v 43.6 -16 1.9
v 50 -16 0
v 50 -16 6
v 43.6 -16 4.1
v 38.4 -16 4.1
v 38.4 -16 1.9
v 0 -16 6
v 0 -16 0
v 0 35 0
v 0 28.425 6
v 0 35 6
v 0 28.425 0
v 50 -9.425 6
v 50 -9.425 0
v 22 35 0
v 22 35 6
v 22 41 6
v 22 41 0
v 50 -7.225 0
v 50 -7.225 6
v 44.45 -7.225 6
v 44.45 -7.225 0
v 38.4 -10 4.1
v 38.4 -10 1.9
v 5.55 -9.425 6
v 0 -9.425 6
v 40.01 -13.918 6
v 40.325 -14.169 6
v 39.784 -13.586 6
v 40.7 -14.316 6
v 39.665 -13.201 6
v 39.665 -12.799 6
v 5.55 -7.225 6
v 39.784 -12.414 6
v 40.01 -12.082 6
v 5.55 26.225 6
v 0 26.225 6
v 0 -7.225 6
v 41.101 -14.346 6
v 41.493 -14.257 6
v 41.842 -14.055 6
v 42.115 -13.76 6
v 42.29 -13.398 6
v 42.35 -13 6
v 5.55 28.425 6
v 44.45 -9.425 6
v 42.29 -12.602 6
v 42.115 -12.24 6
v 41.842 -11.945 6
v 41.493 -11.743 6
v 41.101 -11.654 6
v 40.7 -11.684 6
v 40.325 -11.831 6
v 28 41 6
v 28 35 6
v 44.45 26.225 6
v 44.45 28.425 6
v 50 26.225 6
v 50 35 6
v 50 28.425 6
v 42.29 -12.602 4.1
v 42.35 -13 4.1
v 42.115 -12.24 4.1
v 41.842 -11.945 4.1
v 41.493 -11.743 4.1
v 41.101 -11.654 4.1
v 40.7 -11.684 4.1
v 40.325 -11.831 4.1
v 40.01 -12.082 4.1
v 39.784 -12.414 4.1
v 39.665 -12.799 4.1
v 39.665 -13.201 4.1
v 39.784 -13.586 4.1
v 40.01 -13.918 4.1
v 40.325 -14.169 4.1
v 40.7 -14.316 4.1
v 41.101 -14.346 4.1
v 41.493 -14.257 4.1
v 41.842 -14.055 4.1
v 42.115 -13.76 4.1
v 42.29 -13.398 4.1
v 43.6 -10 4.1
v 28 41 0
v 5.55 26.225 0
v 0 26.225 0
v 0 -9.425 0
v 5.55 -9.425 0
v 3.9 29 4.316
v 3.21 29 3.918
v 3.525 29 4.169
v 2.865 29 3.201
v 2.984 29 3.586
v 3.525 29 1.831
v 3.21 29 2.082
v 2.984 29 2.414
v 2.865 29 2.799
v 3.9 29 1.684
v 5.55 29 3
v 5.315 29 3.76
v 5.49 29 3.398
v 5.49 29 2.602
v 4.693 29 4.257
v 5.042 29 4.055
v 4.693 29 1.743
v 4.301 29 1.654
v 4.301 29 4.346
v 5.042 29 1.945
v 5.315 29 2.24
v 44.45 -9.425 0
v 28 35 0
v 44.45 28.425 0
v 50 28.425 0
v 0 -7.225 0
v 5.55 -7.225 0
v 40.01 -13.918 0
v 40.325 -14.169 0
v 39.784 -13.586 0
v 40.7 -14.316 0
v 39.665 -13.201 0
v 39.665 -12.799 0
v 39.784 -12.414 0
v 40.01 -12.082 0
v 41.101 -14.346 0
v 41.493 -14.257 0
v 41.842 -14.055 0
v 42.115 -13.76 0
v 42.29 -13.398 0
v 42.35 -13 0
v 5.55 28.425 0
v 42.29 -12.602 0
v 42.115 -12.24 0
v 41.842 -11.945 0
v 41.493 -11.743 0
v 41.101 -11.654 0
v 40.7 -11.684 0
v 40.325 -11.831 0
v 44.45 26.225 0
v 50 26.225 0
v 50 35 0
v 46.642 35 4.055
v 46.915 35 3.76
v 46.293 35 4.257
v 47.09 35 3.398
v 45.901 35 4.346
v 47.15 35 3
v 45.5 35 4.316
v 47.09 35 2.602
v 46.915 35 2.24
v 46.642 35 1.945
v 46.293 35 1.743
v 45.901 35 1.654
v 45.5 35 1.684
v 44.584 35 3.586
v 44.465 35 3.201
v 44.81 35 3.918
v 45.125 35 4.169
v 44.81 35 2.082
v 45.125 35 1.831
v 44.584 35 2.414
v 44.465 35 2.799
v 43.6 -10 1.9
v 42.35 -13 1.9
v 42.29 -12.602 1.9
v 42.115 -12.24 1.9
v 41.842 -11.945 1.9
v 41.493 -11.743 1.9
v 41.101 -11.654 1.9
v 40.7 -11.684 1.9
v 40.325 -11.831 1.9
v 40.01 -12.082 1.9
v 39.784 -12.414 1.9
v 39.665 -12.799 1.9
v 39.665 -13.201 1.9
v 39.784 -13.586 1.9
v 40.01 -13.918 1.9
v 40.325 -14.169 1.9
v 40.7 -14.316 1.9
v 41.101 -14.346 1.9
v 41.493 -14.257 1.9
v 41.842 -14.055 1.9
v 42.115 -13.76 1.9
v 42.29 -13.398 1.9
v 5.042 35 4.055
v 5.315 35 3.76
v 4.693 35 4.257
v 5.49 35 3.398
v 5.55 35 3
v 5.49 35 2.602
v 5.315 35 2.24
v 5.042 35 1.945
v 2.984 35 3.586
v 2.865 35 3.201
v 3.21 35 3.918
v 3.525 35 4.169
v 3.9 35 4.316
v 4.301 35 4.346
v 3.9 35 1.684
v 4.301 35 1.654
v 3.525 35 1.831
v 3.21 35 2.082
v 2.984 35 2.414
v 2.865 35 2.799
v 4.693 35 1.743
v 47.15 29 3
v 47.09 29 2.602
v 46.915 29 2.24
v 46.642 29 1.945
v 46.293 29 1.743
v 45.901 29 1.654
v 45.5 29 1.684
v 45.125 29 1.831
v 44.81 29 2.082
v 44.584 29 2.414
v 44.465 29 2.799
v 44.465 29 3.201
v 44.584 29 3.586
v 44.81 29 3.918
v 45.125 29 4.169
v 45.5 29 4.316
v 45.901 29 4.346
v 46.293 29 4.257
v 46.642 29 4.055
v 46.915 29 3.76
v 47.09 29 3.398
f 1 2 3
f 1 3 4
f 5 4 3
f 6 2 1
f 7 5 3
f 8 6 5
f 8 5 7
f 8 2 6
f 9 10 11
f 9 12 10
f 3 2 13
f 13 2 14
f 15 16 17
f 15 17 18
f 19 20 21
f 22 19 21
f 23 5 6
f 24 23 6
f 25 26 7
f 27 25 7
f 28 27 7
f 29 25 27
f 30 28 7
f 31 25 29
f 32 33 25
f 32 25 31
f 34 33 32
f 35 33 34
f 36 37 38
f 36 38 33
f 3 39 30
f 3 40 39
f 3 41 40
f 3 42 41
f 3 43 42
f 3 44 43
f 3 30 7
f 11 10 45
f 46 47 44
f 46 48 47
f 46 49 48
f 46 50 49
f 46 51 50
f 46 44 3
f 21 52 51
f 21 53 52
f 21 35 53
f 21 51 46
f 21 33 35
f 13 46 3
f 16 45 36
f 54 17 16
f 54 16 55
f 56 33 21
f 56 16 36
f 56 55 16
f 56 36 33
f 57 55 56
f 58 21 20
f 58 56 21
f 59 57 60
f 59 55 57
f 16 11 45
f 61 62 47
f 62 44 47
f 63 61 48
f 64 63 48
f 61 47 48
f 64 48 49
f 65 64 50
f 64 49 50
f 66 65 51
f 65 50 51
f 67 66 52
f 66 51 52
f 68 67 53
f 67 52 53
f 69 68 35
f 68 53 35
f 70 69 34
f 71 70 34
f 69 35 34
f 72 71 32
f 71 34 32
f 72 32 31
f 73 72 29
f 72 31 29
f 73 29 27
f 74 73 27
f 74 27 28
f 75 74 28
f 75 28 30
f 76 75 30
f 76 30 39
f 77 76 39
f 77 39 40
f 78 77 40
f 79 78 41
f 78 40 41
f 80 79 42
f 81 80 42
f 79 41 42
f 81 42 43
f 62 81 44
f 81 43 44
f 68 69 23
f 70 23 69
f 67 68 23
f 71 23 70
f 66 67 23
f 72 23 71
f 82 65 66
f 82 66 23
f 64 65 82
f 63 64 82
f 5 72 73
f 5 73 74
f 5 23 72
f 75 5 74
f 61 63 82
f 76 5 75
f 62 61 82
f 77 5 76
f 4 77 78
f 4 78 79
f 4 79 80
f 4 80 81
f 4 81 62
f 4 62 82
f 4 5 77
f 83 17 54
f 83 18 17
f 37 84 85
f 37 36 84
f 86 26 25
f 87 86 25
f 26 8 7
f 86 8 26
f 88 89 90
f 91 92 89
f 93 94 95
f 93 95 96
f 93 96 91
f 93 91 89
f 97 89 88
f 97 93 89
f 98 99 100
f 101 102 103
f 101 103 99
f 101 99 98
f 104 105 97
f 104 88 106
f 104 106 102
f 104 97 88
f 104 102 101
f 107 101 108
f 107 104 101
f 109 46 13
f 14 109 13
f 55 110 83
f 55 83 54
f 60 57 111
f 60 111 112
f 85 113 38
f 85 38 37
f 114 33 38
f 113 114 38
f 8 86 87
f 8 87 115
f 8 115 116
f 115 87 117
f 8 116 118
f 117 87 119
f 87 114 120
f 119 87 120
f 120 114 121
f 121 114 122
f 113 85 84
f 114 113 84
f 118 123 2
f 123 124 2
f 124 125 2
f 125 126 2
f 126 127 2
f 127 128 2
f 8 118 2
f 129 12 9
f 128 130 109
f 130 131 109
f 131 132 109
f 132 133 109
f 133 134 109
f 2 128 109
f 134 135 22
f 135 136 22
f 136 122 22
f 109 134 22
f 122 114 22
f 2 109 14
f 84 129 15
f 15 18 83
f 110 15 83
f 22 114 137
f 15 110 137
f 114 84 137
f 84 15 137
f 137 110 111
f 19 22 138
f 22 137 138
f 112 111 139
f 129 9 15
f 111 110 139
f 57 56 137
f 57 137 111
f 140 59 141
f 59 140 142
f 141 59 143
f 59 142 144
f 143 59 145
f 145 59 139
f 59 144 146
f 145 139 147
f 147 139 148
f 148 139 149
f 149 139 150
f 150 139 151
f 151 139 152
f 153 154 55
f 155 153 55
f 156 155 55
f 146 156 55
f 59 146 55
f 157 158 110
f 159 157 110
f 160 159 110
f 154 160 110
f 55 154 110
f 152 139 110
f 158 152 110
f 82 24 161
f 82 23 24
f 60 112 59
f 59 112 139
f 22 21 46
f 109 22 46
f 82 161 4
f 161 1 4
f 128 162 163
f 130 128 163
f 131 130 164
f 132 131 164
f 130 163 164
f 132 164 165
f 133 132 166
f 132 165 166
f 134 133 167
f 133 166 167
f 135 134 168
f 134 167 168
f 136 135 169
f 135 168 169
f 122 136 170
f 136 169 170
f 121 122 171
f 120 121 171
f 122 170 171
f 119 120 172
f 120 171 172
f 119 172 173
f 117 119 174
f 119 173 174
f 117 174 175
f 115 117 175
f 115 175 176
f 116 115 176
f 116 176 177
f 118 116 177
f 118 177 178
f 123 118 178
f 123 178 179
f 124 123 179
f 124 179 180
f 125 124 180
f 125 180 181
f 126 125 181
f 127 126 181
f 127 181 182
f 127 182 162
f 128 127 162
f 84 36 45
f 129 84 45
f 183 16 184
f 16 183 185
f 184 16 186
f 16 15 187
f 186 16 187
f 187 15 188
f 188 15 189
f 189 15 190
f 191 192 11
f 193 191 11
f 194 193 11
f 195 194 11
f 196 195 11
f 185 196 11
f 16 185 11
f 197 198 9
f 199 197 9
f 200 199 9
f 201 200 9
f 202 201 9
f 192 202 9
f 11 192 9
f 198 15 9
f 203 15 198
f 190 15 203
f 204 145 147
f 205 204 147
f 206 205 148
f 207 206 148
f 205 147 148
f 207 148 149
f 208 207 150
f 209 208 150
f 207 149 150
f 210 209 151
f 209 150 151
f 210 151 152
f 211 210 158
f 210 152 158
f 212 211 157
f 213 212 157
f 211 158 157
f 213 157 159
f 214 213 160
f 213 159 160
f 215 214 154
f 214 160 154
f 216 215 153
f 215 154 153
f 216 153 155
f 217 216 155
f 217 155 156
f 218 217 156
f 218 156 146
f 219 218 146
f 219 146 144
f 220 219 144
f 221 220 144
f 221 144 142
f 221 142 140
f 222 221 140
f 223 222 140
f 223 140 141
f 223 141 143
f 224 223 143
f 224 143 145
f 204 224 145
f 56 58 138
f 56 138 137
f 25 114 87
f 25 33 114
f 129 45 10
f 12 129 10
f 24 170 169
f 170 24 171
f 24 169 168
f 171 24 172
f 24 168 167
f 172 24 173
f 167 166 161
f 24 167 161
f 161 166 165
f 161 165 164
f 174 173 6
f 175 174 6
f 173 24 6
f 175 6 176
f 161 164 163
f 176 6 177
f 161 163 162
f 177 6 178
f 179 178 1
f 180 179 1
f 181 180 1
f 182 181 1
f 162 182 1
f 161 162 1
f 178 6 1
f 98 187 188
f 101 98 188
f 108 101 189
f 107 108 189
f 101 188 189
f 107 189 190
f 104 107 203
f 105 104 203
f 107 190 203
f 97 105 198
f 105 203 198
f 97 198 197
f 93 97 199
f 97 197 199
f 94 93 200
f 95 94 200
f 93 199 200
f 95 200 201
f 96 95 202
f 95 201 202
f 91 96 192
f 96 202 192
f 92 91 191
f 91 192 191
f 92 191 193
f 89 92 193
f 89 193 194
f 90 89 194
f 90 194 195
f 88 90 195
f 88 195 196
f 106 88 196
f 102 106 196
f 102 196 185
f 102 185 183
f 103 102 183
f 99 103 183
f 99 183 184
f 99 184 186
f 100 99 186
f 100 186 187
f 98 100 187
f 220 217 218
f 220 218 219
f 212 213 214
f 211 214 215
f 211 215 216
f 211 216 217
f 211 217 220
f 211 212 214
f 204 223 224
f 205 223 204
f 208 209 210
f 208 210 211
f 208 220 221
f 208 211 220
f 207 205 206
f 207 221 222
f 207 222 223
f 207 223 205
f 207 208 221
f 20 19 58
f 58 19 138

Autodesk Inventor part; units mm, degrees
ref_plane "YZ Plane" through (0, 0, 0) normal (1, 0, 0) x (0, 1, 0)
ref_plane "XZ Plane" through (0, 0, 0) normal (0, 1, 0) x (-1, 0, 0)
ref_plane "XY Plane" through (0, 0, 0) normal (0, 0, 1) x (1, 0, 0)
sketch "스케치1" plane through (0, 0, 0) normal (0, 0, 1) x (1, 0, 0)
  line L0 (0, 0) -> (50, 0) projected
  line L1 (50, 0) -> (50, 25) projected
  line L2 (0, 25) -> (50, 25) projected
  line L3 (0, 0) -> (0, 25) projected
  line L4 (8.4, 0) -> (0, 0) projected
  line L5 (0, 0) -> (0, -16) projected
  line L6 (50, -16) -> (0, -16) projected
  line L7 (50, 0) -> (50, -16) projected
  line L8 (50, 0) -> (41.6, 0) projected
  line L9 (41.6, 0) -> (41.6, -10) projected
  line L10 (41.6, -10) -> (8.4, -10) projected
  line L11 (8.4, 0) -> (8.4, -10) projected
  line L12 (0, 25) -> (50, 25)
  line L13 (50, 25) -> (50, 35)
  line L14 (50, 35) -> (0, 35)
  line L15 (0, 35) -> (0, 25)
  line L16 (0, -16) -> (50, -16)
  line L17 (50, -16) -> (50, 35)
  line L18 (50, 35) -> (0, 35)
  line L19 (0, 35) -> (0, -16)
  dimension "d0" = 10
extrude "돌출1" add sketch "스케치1" along normal blind 6
sketch "스케치2" plane through (0, 0, 6) normal (0, 0, 1) x (1, 0, 0)
  circle A0 centre (41, -13) radius 1.35 projected
  point P0 (0, 0)
extrude "돌출2" cut sketch "스케치2" against normal up to next
sketch "스케치3" plane through (0, 35, 0) normal (0, 1, 0) x (1, 0, 0)
  line L0 (50, 0) -> (0, 0) projected
  line L1 (28, -6) -> (50, -6) projected
  line L2 (39, -6) -> (25, 0)
  line L3 (39, -6) -> (22, -6)
  line L4 (22, -6) -> (22, 0)
  line L5 (22, 0) -> (39, 0)
  line L6 (39, 0) -> (39, -6)
  line L7 (39, 0) -> (28, 0)
  line L8 (28, 0) -> (28, -6)
  line L9 (28, -6) -> (39, -6)
  line L10 (39, -6) -> (39, 0)
  point P0 (22, -6)
extrude "돌출3" add sketch "스케치3" along normal blind 6 contours L8 L2 L0 | L2 L8 L3 L4 L0
sketch "스케치4" plane through (50, 35, 6) normal (0, 1, 0) x (1, 0, 0)
  circle A0 centre (-4.2, 79) radius 1.35 projected
  circle A1 centre (-4.2, 3) radius 1.35 projected
  circle A2 centre (-45.8, 79) radius 1.35 projected
  circle A3 centre (-45.8, 3) radius 1.35 projected
  circle A4 centre (-4.2, 71.8) radius 1.6 projected
  circle A5 centre (-45.8, 71.8) radius 1.6 projected
  circle A6 centre (-4.2, 10.2) radius 1.6 projected
  circle A7 centre (-45.8, 10.2) radius 1.6 projected
  line L0 (-50, 0) -> (-28, 0) projected
  line L1 (-28, 0) -> (-28, 6) projected
  line L2 (-28, 6) -> (-22, 6) projected
  line L3 (-22, 6) -> (-22, 0) projected
  line L4 (-22, 0) -> (0, 0) projected
  line L5 (0, 0) -> (0, 82) projected
  line L6 (0, 82) -> (-50, 82) projected
  line L7 (-50, 82) -> (-50, 0) projected
  point P0 (-50, 6)
extrude "돌출4" cut sketch "스케치4" against normal blind 6 contours A1 | A3
sketch "스케치6" plane through (0, 0, 6) normal (0, 0, 1) x (1, 0, 0)
  line L0 (47.05, 26.225) -> (47.05, 40.9)
  line L1 (47.05, 31.225) -> (47.05, 40.9)
  line L2 (47.05, 26.225) -> (49.65, 26.225)
  line L3 (50, -16) -> (50, 35) projected
  line L4 (47.05, 26.225) -> (44.45, 26.225)
  line L5 (44.45, 26.225) -> (44.45, 28.425)
  line L6 (44.45, 28.425) -> (49.65, 28.425)
  line L7 (49.65, 28.425) -> (49.65, 26.225)
  line L8 (28, 41) -> (22, 41) projected
  line L9 (25, 41) -> (25, 38)
  line L10 (2.95, 26.225) -> (0.35, 26.225)
  line L11 (2.95, 26.225) -> (5.55, 26.225)
  line L12 (5.55, 26.225) -> (5.55, 28.425)
  line L13 (5.55, 28.425) -> (0.35, 28.425)
  line L14 (0.35, 28.425) -> (0.35, 26.225)
  line L15 (0, 35) -> (0, -16) projected
  line L16 (0.35, 26.225) -> (0, 26.225)
  line L17 (0, 26.225) -> (0, 28.425)
  line L18 (0, 28.425) -> (0.35, 28.425)
  line L19 (0.35, 28.425) -> (0.35, 26.225)
  line L20 (49.65, 28.425) -> (50, 28.425)
  line L21 (50, 28.425) -> (50, 26.225)
  line L22 (50, 26.225) -> (49.65, 26.225)
  line L23 (49.65, 26.225) -> (49.65, 28.425)
  line L24 (0, 9.5) -> (2.95, 9.5)
  line L25 (47.05, -7.225) -> (49.65, -7.225)
  line L26 (47.05, -7.225) -> (44.45, -7.225)
  line L27 (44.45, -7.225) -> (44.45, -9.425)
  line L28 (44.45, -9.425) -> (49.65, -9.425)
  line L29 (49.65, -9.425) -> (49.65, -7.225)
  line L30 (2.95, -7.225) -> (0.35, -7.225)
  line L31 (2.95, -7.225) -> (5.55, -7.225)
  line L32 (5.55, -7.225) -> (5.55, -9.425)
  line L33 (5.55, -9.425) -> (0.35, -9.425)
  line L34 (0.35, -9.425) -> (0.35, -7.225)
  line L35 (0.35, -7.225) -> (0, -7.225)
  line L36 (0, -7.225) -> (0, -9.425)
  line L37 (0, -9.425) -> (0.35, -9.425)
  line L38 (0.35, -9.425) -> (0.35, -7.225)
  line L39 (49.65, -9.425) -> (50, -9.425)
  line L40 (50, -9.425) -> (50, -7.225)
  line L41 (50, -7.225) -> (49.65, -7.225)
  line L42 (49.65, -7.225) -> (49.65, -9.425)
  point P0 (0, 0)
  point P1 (47.05, -12.225)
  point P2 (0, -7.225)
  point P3 (0, 26.225)
  dimension "d11" = 2.6
  dimension "d12" = 2.6
  dimension "d13" = 2.2
extrude "돌출6" cut sketch "스케치6" against normal up to next
sketch "스케치7" plane through (0, -16, 0) normal (0, -1, 0) x (1, 0, 0)
  line L0 (42.25, -2.775) -> (42.25, 11.9)
  line L1 (39.75, -2.775) -> (39.75, 11.9)
  line L2 (42.25, -2.775) -> (39.75, -2.775)
  line L3 (41, -2.775) -> (41, 6)
  line L4 (41, 0) -> (41, 6)
  line L5 (41, 3) -> (43.6, 3)
  line L6 (41, 3) -> (38.4, 3)
  line L7 (43.6, 3) -> (38.4, 3)
  line L8 (38.4, 3) -> (38.4, 1.9)
  line L9 (38.4, 1.9) -> (43.6, 1.9)
  line L10 (43.6, 1.9) -> (43.6, 3)
  line L11 (38.4, 3) -> (38.4, 4.1)
  line L12 (38.4, 4.1) -> (43.6, 4.1)
  line L13 (43.6, 4.1) -> (43.6, 3)
  point P0 (0, 0)
  dimension "d16" = 2.6
  dimension "d17" = 2.6
  dimension "d18" = 1.1
extrude "돌출7" cut sketch "스케치7" against normal blind 6 contours L9 L3 L5 L0 | L0 L5 L10 L9 | L5 L3 L12 L0 | L0 L12 L13 L5 | L9 L1 L6 L3 | L6 L1 L12 L3 | L9 L8 L6 L1 | L6 L11 L12 L1
properties part number "head_side"
